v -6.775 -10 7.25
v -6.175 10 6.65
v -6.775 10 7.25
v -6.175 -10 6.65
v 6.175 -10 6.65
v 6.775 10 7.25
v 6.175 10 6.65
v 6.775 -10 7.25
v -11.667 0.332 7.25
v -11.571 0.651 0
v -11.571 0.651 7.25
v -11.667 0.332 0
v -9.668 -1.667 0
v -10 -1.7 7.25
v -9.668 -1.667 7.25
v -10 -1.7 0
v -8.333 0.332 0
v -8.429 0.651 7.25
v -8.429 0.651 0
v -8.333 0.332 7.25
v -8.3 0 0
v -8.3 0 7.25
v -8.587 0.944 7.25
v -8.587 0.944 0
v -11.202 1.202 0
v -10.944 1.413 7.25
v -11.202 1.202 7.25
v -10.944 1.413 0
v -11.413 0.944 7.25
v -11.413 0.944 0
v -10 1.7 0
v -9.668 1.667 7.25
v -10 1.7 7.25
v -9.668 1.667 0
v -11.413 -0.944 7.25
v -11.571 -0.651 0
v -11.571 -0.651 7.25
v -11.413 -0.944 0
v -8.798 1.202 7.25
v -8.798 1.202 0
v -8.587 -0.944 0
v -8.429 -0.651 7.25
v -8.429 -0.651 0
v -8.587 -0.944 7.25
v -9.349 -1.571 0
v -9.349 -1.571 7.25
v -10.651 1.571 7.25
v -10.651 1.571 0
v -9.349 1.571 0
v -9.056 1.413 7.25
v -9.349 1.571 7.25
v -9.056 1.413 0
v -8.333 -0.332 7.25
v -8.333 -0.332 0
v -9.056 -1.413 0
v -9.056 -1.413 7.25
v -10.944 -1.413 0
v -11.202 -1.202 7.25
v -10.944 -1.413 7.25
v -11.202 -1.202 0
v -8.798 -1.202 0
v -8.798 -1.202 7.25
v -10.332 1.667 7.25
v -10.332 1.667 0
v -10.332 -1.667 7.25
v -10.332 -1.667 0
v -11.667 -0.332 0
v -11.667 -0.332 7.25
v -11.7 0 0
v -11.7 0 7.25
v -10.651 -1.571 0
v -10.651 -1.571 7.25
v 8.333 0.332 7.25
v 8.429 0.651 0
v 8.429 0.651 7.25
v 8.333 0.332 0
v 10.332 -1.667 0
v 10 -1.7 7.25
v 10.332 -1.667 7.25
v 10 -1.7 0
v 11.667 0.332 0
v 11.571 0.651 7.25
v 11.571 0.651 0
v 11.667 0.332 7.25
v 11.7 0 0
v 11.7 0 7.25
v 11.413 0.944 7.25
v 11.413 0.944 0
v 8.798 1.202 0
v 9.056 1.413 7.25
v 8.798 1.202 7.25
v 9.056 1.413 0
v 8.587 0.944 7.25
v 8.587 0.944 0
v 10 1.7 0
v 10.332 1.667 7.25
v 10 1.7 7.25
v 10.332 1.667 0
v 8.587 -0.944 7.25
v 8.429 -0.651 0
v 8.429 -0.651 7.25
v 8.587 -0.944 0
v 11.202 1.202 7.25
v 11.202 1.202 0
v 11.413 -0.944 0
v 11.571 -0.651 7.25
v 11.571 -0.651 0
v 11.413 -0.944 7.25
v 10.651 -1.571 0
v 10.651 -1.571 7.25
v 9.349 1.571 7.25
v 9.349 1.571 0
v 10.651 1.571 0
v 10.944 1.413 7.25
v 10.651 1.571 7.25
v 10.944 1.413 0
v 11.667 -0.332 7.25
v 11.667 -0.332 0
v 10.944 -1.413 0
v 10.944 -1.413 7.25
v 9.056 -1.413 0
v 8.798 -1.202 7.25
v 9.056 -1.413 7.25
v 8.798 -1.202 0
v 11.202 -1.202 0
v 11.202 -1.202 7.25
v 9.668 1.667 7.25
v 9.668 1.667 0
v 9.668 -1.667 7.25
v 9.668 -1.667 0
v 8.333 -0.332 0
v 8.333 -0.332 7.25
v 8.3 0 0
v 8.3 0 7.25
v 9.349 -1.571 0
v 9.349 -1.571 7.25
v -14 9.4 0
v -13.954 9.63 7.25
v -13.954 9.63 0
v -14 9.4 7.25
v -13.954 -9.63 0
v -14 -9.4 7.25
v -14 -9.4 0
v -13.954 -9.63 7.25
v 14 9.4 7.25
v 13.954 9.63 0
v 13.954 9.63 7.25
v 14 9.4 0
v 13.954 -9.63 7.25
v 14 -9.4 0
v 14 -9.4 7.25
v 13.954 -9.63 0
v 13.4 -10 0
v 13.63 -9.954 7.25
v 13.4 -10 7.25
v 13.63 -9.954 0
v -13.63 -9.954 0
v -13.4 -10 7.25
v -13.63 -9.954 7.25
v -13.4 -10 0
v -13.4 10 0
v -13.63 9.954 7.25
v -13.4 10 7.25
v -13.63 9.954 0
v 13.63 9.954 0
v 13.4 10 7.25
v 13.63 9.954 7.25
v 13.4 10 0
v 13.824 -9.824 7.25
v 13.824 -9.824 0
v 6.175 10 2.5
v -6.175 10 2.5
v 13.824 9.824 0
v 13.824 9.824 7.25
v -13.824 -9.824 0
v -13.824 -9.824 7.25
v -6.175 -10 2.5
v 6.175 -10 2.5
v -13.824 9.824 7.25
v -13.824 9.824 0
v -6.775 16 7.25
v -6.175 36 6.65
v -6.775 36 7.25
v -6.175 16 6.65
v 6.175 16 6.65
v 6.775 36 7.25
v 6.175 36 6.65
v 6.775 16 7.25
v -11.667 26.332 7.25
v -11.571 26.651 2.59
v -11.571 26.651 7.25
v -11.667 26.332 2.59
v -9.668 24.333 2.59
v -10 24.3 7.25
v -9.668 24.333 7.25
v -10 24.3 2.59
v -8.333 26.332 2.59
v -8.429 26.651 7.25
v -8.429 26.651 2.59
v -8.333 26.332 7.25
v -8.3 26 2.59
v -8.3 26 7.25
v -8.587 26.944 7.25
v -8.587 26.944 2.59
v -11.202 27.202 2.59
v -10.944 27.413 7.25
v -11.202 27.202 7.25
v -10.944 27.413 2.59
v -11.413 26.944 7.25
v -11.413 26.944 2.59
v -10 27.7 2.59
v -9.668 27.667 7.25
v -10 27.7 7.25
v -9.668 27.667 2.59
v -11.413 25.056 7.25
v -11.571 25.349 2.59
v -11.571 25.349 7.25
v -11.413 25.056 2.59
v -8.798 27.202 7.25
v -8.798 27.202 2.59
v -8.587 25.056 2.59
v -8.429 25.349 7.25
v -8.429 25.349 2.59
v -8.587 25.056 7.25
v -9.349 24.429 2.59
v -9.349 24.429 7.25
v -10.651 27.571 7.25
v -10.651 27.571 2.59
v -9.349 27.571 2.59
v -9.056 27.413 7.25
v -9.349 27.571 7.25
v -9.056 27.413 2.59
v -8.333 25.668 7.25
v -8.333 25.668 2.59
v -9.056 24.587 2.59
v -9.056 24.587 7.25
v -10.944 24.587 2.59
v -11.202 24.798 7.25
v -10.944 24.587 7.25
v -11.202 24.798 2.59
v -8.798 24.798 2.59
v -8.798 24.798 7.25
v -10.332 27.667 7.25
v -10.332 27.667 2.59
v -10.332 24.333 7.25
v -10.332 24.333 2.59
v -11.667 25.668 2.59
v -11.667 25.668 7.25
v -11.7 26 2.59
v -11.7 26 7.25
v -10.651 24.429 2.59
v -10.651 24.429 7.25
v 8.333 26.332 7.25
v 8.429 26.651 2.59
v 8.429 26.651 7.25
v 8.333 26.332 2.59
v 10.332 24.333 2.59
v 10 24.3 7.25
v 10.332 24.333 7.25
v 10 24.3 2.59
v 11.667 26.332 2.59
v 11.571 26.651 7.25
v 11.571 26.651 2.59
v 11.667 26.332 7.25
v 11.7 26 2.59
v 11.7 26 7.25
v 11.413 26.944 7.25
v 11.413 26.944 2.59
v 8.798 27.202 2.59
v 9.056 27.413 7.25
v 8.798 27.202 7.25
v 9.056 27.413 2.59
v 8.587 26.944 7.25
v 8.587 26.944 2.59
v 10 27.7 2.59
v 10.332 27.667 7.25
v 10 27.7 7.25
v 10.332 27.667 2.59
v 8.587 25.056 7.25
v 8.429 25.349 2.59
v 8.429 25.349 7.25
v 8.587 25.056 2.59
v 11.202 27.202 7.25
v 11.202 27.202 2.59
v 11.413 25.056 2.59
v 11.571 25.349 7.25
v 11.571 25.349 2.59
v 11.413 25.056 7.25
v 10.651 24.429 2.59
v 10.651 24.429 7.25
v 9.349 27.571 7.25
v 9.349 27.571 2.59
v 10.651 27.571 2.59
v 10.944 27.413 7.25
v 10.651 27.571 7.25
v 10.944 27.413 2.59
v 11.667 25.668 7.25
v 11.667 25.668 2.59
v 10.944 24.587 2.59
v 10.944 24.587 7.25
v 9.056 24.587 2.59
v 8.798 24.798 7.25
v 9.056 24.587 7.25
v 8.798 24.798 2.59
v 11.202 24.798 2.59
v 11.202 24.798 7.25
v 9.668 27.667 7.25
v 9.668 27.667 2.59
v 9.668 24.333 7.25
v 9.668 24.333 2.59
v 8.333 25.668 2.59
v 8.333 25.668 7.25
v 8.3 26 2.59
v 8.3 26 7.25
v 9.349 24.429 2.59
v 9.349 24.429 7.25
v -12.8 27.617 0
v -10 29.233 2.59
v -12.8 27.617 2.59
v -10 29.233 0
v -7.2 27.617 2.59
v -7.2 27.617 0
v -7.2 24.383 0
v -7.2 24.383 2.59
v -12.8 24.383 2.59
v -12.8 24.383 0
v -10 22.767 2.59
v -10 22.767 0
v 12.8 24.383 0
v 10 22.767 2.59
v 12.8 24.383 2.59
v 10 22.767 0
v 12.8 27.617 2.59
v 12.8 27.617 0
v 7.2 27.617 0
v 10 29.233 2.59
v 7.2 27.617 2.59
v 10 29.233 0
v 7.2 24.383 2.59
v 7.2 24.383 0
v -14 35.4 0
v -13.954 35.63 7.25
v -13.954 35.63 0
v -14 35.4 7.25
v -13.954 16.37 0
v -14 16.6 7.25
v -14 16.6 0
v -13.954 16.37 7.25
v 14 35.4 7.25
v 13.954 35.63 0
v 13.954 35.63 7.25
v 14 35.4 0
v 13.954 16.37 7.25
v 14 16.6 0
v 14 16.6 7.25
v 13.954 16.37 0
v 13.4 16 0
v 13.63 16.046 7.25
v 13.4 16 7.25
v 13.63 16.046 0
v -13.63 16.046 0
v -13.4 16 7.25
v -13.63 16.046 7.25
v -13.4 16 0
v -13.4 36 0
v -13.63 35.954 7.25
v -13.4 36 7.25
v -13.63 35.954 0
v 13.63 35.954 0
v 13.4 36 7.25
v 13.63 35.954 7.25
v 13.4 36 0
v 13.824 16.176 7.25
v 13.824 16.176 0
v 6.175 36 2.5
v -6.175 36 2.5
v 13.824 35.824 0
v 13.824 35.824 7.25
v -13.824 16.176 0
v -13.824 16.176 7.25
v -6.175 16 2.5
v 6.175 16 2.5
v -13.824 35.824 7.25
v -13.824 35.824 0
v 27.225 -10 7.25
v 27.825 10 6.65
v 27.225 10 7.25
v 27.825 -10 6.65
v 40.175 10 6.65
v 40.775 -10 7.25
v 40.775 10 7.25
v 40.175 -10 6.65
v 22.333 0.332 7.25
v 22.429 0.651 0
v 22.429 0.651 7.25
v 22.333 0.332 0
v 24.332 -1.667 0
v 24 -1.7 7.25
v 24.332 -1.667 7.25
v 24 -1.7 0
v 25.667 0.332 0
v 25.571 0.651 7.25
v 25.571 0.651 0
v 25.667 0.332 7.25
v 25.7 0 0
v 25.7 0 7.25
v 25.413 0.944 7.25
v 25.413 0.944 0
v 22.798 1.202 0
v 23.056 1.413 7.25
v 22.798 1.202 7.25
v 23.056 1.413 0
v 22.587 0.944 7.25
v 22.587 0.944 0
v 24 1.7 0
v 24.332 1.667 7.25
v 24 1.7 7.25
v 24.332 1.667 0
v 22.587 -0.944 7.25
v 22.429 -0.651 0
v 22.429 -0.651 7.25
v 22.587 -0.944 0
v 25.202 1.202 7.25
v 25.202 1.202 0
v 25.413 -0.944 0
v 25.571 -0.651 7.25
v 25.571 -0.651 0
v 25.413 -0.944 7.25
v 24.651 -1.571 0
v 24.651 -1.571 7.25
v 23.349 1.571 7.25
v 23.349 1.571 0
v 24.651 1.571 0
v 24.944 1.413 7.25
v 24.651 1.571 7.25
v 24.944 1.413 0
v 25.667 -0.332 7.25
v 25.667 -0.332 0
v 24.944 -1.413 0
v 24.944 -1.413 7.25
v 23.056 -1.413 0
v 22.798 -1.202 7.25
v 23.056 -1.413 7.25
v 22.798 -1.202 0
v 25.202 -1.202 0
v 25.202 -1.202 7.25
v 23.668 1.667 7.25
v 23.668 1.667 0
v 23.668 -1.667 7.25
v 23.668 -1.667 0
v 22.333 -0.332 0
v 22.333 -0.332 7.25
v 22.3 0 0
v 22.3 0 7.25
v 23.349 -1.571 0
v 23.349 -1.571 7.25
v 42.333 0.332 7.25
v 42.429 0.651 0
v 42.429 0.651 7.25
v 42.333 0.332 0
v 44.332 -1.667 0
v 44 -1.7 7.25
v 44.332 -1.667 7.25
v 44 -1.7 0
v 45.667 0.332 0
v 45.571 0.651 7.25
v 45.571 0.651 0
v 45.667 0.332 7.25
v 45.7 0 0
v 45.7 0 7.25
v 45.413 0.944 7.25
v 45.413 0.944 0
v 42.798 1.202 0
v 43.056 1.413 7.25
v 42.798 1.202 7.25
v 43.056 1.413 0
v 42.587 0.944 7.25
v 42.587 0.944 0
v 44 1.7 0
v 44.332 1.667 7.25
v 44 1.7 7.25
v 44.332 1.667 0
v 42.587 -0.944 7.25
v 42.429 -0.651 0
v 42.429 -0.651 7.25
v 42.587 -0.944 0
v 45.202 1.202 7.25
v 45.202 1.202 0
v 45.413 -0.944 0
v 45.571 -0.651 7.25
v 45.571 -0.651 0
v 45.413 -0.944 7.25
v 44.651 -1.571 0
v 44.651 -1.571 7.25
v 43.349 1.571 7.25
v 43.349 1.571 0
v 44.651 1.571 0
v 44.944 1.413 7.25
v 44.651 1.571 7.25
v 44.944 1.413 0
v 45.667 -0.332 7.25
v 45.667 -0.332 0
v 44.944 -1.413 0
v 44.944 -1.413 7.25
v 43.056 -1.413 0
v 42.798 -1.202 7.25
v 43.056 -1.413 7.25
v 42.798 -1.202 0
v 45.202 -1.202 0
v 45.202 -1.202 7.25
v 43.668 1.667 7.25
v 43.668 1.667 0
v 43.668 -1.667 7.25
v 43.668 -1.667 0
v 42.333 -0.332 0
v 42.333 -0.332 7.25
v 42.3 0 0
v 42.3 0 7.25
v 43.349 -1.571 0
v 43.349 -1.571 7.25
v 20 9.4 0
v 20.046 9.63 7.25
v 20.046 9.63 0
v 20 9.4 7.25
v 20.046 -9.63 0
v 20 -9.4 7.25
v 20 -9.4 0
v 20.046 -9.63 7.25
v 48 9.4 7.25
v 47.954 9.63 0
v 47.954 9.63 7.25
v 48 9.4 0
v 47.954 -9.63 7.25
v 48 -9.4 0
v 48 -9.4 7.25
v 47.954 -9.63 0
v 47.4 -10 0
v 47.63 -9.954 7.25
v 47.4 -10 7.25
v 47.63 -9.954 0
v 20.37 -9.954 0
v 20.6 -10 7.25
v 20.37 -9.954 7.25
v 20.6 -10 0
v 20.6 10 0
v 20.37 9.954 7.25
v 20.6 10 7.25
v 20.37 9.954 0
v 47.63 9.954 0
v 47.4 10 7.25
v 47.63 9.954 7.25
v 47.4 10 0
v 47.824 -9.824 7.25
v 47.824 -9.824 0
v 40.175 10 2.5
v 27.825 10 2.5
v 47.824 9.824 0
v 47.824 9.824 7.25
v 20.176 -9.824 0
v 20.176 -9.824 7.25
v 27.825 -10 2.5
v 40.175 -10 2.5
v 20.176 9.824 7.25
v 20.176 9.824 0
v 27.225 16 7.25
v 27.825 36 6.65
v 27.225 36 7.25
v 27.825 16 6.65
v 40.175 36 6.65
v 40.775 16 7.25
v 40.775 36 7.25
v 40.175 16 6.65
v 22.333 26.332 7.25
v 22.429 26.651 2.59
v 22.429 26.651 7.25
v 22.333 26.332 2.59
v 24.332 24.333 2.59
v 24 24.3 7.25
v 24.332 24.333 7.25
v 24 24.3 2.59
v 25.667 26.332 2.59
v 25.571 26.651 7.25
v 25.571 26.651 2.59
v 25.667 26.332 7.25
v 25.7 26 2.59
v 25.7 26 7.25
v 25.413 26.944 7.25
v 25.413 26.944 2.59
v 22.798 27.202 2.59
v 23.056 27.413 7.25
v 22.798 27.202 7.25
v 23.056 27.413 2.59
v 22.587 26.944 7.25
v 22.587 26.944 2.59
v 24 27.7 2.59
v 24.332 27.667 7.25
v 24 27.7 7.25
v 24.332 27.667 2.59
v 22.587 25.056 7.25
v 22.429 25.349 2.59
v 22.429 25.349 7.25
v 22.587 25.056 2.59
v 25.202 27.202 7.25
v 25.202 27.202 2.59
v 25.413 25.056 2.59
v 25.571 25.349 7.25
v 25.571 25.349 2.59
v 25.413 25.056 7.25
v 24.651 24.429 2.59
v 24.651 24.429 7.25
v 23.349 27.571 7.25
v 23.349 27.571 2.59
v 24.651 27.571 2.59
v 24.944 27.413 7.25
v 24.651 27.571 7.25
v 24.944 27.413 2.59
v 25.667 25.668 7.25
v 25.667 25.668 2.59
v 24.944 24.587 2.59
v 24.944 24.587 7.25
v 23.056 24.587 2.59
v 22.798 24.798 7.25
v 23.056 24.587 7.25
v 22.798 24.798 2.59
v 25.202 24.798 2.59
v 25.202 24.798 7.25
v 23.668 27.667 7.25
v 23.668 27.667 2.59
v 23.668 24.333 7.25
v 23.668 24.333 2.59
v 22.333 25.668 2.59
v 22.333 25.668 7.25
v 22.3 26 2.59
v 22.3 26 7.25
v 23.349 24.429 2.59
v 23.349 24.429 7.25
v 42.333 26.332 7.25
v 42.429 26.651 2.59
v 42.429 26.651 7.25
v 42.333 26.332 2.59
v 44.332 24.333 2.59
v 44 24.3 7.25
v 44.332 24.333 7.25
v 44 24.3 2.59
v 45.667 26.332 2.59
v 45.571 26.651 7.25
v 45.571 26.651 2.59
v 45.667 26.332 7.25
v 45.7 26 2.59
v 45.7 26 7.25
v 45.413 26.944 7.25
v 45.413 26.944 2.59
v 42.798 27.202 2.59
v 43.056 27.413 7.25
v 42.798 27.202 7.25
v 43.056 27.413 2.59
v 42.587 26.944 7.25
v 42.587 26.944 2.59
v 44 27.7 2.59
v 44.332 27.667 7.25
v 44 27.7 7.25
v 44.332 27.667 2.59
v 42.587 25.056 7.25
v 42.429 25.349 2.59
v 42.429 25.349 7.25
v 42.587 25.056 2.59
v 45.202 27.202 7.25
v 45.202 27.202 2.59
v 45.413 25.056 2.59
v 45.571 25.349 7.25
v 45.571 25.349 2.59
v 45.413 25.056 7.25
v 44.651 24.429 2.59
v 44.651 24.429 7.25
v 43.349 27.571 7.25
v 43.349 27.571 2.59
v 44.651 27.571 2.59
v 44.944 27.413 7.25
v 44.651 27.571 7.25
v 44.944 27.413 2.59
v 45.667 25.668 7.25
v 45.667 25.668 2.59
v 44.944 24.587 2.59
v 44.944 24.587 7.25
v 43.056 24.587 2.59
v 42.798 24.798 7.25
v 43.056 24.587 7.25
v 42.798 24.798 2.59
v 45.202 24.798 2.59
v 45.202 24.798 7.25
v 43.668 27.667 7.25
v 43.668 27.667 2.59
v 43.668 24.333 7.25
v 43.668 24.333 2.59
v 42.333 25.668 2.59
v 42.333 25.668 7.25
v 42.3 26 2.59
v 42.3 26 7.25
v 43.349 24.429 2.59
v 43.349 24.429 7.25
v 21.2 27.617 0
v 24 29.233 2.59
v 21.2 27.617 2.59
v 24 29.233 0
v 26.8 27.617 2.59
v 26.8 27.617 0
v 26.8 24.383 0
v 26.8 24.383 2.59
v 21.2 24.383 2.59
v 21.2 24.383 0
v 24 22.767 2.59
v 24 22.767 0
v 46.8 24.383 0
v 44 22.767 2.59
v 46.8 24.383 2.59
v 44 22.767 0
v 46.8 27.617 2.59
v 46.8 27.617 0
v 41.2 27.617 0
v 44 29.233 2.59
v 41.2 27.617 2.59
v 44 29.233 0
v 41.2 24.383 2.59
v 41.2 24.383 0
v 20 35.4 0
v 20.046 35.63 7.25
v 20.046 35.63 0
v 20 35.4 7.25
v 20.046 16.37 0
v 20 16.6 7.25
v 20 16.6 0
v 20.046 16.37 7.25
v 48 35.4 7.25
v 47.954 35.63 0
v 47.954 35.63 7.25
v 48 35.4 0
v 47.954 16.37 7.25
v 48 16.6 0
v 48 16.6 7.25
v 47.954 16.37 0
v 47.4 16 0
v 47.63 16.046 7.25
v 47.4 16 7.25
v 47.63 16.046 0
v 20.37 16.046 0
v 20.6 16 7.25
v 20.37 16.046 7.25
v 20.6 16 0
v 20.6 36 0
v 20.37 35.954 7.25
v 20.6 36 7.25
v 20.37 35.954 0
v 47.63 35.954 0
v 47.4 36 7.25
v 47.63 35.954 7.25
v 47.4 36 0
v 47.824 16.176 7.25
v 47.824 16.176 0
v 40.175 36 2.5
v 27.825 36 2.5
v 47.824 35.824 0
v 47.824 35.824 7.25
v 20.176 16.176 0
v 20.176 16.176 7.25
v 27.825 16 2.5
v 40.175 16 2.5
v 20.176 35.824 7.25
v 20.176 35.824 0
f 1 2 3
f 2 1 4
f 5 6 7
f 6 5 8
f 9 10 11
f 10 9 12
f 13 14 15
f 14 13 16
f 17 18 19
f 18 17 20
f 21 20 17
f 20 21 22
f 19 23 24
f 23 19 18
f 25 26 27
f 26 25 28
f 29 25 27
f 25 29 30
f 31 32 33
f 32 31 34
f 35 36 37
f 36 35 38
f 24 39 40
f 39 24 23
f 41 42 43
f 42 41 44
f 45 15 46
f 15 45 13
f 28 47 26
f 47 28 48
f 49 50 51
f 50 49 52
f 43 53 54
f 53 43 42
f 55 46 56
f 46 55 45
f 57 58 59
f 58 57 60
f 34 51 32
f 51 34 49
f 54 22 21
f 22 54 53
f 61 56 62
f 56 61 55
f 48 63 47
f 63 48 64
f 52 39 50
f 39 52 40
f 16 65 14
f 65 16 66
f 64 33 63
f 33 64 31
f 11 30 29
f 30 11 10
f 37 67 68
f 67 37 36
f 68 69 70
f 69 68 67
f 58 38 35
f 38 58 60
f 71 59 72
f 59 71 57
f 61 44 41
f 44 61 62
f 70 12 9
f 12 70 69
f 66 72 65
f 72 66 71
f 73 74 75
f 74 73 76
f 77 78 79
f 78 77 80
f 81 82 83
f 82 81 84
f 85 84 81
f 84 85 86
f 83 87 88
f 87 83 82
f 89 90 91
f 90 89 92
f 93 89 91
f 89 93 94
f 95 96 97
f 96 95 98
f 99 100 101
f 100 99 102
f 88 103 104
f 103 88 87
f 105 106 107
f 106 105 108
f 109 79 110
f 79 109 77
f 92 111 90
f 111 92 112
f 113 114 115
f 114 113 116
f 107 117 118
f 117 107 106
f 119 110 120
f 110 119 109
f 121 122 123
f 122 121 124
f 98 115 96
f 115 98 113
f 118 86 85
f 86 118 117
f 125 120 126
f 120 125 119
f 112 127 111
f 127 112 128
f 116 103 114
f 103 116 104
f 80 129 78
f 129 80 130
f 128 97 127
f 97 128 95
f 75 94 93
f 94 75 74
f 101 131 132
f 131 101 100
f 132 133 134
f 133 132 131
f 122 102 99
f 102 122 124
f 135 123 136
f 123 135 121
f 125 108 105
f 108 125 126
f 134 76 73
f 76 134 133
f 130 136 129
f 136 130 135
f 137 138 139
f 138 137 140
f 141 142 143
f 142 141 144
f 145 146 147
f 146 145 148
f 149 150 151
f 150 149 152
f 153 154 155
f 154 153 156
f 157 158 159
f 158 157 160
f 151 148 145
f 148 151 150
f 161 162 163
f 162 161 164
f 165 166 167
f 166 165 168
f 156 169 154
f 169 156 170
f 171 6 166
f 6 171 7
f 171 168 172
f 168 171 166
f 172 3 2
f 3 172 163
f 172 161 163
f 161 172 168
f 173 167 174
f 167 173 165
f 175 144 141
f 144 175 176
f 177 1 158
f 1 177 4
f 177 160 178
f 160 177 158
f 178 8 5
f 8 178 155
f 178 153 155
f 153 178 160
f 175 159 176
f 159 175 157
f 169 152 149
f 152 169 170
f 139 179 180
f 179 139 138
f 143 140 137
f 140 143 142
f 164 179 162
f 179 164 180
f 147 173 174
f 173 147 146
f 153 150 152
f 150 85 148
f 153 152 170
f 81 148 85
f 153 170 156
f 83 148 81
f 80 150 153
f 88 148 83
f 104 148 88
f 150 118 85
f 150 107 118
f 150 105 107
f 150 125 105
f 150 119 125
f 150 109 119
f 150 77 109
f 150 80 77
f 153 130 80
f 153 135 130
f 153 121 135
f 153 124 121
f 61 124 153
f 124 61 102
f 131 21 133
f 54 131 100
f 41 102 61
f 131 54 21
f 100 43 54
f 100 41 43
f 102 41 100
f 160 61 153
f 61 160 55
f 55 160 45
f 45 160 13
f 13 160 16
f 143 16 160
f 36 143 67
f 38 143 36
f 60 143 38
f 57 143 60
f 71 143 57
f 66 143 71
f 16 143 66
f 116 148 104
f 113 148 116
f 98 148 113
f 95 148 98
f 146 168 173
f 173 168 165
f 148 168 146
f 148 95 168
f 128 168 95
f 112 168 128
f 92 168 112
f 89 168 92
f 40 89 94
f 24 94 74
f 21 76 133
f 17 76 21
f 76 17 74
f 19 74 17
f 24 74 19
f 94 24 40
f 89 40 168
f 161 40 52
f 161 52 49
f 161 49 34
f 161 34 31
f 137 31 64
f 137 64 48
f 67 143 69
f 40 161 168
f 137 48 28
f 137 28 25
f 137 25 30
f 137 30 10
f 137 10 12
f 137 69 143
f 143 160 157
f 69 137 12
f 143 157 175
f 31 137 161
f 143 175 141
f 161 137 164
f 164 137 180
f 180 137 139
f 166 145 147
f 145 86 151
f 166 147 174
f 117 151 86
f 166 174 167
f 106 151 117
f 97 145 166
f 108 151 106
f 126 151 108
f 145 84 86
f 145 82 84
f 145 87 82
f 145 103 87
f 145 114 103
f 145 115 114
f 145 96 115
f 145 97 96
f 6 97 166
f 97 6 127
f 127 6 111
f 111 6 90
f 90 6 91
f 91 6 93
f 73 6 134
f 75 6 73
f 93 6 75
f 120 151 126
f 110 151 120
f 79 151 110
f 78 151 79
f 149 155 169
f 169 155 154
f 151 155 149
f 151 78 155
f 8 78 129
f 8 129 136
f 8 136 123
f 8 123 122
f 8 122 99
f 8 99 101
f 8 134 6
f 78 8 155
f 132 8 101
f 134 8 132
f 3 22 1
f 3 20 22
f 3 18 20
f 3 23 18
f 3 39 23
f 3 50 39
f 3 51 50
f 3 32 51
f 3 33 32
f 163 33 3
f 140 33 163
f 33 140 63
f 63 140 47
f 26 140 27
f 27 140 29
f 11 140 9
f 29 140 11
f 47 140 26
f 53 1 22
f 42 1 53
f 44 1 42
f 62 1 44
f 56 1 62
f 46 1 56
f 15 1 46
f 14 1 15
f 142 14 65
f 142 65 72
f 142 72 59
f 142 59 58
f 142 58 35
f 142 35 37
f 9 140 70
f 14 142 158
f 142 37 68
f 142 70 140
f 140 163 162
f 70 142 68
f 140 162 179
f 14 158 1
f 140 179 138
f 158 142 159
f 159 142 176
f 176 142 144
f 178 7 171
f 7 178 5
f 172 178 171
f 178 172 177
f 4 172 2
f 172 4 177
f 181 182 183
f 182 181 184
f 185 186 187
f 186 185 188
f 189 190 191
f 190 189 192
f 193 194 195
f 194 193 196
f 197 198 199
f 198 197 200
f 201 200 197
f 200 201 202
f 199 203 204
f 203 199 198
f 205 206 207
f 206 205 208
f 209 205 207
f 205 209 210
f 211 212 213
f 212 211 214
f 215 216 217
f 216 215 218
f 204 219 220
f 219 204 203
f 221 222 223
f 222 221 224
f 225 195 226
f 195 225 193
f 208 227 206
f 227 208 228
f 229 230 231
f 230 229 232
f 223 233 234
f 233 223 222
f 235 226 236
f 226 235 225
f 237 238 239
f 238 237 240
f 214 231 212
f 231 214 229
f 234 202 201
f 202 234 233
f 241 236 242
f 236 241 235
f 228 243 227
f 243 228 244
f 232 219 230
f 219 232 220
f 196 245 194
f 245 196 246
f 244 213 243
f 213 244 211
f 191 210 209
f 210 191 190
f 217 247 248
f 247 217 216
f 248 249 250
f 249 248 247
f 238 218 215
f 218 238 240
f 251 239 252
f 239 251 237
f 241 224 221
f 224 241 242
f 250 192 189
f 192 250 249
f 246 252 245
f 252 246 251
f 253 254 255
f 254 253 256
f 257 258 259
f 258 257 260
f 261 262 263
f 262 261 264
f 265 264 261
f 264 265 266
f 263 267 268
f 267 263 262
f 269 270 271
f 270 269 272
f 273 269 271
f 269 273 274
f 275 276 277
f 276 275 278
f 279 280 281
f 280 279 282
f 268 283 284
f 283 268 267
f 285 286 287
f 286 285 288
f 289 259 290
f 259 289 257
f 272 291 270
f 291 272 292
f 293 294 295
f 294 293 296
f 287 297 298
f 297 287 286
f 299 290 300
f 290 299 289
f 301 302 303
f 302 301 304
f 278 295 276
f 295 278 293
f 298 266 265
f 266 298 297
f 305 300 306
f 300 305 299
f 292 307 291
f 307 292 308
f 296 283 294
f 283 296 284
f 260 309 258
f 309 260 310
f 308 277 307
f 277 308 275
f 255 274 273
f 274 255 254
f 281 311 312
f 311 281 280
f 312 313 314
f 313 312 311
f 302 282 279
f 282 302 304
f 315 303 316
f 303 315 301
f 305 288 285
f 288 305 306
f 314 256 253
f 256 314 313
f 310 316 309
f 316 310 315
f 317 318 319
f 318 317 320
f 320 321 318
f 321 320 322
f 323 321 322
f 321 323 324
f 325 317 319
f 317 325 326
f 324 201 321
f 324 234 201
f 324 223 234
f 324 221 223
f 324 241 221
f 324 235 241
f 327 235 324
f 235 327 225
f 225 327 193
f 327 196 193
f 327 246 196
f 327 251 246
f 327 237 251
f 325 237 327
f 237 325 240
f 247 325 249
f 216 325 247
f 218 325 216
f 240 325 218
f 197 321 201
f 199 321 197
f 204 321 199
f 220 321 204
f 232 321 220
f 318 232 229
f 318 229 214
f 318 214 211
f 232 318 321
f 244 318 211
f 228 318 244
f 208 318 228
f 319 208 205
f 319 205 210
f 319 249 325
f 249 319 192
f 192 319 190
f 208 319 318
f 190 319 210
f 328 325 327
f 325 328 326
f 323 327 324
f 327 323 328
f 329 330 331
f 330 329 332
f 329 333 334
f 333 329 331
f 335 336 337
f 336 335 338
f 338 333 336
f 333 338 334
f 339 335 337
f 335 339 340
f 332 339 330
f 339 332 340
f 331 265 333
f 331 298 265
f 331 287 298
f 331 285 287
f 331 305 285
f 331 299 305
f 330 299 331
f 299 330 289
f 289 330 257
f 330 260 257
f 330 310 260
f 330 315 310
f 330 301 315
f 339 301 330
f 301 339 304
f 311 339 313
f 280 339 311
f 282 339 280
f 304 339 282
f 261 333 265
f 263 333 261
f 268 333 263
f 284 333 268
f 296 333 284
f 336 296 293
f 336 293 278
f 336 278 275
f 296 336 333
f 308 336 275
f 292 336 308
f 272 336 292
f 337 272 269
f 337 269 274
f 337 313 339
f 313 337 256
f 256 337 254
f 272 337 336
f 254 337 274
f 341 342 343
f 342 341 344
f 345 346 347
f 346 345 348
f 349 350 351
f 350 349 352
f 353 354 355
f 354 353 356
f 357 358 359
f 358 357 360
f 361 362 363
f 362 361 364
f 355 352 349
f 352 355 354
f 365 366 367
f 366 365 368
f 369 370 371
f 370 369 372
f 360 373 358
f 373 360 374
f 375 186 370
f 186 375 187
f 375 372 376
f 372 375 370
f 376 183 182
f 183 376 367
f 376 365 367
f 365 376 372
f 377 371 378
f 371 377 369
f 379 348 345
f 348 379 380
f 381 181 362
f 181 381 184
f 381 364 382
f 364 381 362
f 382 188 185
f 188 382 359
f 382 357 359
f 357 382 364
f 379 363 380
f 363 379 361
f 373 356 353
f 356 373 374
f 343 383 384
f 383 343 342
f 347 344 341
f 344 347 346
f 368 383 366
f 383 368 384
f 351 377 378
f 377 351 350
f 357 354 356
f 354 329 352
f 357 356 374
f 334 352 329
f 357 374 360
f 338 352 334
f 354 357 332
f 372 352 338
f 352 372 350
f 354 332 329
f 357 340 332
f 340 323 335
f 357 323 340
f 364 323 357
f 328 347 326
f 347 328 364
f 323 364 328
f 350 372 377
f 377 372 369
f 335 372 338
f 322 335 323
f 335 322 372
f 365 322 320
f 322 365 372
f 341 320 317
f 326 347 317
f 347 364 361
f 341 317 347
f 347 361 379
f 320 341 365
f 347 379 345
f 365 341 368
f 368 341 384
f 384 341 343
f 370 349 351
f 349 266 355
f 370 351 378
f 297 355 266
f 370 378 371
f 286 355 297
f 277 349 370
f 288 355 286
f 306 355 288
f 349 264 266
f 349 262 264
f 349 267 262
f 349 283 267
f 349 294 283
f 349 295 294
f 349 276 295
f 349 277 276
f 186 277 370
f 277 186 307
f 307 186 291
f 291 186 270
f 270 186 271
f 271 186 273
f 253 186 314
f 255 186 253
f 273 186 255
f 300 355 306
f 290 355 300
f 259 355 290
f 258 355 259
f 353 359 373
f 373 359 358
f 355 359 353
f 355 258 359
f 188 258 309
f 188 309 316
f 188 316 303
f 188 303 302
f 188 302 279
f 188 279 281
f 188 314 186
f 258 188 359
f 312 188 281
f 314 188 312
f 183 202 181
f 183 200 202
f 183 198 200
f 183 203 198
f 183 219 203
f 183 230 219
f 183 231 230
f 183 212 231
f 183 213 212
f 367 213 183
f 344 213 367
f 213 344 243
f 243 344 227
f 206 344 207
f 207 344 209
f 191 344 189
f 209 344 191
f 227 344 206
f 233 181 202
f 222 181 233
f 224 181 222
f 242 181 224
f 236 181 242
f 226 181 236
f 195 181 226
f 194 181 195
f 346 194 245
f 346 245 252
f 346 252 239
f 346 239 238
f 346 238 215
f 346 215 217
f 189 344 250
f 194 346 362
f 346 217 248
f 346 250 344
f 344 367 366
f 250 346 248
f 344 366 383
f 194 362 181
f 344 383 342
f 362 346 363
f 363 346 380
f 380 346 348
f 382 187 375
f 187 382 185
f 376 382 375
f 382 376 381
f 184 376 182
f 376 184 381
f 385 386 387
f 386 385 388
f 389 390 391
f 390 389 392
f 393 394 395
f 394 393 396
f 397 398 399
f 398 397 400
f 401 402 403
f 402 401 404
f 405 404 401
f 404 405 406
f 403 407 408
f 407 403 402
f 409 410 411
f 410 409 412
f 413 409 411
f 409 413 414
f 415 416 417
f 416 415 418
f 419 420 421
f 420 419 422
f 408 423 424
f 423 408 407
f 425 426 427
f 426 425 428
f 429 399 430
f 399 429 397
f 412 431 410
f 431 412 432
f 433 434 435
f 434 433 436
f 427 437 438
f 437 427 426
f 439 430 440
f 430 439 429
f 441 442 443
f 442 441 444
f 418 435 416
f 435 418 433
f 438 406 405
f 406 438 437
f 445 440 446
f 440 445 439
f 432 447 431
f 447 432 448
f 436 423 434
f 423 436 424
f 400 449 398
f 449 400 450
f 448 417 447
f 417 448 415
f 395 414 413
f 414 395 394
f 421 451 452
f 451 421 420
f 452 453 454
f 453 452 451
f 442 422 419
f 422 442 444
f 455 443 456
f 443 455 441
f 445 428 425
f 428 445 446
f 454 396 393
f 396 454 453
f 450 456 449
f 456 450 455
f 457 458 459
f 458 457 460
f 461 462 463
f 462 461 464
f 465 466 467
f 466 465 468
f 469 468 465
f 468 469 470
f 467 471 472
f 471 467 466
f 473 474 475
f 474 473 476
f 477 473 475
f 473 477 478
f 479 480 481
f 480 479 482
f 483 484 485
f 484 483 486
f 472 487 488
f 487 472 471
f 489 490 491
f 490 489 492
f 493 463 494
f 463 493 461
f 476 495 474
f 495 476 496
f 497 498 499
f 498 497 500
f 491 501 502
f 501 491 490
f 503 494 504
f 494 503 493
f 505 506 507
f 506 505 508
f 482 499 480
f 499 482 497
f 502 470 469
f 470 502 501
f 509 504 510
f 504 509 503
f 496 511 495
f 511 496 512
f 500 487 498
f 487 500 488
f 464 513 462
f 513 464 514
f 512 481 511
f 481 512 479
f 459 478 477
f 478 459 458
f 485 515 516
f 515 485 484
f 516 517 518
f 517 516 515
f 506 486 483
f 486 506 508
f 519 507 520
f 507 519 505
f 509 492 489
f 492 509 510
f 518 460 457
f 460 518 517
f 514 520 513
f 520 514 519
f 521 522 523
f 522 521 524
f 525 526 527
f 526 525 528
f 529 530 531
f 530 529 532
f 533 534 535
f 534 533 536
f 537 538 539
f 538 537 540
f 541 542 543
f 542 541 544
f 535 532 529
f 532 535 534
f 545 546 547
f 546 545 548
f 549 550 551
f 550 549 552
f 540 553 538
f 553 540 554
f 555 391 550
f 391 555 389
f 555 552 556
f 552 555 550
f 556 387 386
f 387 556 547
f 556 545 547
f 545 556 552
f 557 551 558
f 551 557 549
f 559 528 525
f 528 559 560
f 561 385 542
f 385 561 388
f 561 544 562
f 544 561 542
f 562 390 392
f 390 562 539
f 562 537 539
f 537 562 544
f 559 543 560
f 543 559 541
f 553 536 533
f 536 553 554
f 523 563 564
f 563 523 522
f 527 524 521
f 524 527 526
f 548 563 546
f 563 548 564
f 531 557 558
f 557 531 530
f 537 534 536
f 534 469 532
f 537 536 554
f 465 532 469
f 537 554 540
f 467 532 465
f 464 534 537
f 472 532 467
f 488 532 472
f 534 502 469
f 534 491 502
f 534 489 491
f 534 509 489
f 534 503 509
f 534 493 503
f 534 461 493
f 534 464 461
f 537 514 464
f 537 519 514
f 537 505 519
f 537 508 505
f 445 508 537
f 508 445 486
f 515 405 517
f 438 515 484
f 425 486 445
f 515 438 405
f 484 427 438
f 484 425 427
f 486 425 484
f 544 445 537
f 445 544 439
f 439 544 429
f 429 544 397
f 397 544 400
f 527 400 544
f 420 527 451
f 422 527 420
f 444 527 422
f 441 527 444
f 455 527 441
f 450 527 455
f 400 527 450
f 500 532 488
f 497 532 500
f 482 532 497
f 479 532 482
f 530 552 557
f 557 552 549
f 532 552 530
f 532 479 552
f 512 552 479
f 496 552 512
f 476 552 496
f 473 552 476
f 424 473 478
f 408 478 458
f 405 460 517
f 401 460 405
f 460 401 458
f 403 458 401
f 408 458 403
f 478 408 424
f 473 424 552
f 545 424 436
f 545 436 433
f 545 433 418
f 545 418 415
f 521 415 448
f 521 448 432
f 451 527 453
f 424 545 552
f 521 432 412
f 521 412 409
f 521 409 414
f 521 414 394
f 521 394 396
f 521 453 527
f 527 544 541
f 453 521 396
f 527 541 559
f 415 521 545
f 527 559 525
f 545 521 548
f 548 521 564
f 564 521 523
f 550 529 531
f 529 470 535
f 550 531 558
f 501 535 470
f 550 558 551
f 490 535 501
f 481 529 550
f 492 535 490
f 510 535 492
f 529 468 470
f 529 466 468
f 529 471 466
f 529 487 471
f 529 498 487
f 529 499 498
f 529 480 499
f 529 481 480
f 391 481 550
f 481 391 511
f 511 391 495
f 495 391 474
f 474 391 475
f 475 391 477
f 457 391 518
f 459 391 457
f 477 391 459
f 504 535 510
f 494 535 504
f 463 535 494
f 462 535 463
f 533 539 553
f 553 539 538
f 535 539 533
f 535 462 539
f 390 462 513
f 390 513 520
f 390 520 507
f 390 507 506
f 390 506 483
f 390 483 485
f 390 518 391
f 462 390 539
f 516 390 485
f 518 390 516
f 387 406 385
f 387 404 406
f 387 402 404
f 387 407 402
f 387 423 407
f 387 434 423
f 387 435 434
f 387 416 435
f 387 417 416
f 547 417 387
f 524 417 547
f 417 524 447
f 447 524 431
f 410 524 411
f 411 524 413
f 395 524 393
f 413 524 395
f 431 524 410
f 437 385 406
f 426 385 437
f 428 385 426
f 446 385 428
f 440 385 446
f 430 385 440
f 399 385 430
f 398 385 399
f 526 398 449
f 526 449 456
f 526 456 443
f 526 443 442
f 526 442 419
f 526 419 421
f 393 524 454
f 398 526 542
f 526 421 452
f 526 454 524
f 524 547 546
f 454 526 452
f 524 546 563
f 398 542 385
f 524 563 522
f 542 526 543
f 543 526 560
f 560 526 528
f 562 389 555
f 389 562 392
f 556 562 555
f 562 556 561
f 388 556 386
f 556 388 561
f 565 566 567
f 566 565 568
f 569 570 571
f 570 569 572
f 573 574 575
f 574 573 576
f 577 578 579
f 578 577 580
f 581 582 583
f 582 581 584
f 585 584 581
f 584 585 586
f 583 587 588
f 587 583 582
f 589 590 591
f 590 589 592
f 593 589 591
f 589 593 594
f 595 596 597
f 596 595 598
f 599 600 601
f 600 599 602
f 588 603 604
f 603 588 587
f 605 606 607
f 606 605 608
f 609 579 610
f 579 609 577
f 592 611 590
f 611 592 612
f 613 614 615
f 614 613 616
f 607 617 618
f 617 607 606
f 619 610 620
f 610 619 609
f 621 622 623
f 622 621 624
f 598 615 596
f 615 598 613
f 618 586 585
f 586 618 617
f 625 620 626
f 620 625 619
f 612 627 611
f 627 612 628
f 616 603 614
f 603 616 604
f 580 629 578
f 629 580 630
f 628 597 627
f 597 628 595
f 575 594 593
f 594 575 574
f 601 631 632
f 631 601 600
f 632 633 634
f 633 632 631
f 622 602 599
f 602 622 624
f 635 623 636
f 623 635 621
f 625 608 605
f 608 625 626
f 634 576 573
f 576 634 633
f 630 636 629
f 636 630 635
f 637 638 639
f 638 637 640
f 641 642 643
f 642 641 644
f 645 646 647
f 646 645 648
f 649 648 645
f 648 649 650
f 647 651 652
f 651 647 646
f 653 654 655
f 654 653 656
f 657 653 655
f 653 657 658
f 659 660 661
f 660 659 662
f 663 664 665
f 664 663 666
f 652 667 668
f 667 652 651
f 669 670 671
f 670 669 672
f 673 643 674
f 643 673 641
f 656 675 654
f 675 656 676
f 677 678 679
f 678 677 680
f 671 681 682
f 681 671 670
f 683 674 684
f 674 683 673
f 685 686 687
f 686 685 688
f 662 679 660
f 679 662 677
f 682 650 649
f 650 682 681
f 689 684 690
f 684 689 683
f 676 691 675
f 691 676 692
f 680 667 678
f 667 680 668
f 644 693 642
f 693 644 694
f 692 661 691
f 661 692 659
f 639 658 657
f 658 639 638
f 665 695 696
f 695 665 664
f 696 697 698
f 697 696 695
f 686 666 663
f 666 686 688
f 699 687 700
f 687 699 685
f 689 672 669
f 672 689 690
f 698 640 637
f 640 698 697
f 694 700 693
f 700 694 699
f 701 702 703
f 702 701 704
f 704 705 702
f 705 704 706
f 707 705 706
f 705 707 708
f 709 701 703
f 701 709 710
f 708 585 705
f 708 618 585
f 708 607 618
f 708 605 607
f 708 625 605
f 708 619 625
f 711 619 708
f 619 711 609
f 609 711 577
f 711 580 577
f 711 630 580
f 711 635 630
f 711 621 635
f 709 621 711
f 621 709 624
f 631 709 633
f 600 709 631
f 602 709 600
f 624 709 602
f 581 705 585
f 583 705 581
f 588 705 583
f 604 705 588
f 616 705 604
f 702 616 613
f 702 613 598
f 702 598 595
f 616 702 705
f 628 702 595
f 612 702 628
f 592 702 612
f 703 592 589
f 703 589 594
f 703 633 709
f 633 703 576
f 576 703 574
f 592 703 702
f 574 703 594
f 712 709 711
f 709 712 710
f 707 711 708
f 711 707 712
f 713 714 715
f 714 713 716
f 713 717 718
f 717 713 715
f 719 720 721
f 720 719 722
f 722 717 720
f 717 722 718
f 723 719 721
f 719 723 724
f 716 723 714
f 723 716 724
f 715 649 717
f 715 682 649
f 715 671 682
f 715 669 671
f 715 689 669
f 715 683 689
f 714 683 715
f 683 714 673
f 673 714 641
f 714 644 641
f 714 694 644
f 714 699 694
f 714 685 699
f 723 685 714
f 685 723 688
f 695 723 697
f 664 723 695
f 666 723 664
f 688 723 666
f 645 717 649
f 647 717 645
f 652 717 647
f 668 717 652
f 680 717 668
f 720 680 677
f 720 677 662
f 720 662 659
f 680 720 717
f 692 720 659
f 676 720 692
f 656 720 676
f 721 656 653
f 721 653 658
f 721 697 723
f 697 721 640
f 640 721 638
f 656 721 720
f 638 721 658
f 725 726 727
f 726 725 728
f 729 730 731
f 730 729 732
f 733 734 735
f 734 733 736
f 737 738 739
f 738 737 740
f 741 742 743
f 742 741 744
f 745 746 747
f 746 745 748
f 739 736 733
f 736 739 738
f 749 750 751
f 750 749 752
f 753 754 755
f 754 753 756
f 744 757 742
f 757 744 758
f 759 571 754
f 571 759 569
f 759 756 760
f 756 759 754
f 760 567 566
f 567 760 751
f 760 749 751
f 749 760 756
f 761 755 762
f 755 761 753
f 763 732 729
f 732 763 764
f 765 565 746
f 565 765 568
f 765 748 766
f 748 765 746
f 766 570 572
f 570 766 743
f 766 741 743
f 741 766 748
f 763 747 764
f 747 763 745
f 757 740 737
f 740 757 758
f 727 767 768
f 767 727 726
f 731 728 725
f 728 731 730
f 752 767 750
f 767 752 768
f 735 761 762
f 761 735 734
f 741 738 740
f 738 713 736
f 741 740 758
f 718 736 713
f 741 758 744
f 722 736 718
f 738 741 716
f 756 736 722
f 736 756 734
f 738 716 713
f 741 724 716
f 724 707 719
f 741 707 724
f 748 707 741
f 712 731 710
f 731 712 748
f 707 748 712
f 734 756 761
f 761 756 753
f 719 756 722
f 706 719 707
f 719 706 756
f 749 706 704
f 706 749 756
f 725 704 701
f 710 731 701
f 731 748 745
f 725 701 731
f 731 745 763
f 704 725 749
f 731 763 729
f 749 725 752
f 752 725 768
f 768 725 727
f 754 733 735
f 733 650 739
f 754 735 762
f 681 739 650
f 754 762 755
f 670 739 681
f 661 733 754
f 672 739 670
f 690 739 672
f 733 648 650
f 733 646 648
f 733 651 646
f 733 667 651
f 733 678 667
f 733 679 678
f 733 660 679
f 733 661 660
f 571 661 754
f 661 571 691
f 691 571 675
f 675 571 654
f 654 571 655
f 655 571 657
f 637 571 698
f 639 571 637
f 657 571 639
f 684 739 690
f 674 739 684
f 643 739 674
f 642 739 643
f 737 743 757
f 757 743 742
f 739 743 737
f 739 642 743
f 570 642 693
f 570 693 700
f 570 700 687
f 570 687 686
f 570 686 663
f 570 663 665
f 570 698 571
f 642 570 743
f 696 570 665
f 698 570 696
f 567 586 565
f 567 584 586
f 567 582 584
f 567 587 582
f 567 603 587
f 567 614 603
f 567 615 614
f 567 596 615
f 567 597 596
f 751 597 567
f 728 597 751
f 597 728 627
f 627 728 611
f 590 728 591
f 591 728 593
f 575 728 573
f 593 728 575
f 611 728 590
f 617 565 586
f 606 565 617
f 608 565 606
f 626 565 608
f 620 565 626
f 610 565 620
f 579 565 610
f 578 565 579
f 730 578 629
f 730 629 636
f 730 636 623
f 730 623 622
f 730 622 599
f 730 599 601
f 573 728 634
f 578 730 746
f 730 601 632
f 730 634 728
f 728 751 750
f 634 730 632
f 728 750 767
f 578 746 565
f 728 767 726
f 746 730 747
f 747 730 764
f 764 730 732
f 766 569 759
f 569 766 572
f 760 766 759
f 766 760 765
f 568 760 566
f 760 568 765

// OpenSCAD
// =====================================================================
//  GA12-N20 (with encoder) two-piece clamp for the BO-BOT base plate
// =====================================================================
//  Holds the motor BODY (gearbox + can, 12 x 10 mm) between two halves
//  squeezed by two M3 screws. The encoder end stays free.
//
//   base plate (3 mm)       ===============================
//   TOP saddle (bolts up)   [##]   ___________   [##]
//                           [##]  |  motor    |  [##]   <- M3 screws 20 mm apart,
//   BOTTOM cap (nut traps)  [##]  |___________|  [##]      one each side of the motor
//
//  Print: 2 x TOP + 2 x BOTTOM, flat side on the bed, channel facing up.
//  PLA or PETG, 0.2 mm layers, 4 walls, 40 % infill, no supports.
//  Screws: M3 x 20 (from the top of the plate) + M3 nuts in the cap.
//  All sizes in mm. Change the numbers below if your motor measures differently.
// =====================================================================

part = "set";            // "top", "bottom", "set" (2 tops + 2 bottoms), "assembly"

motor_w   = 12.0;        // motor body width  (measure across the gearbox)
motor_h   = 10.0;        // motor body height (across the flats)
fit       = 0.35;        // extra room in the channel width (FDM)
squeeze   = 0.25;        // each half is this much shallower than half the motor -> grip
L         = 20.0;        // clamp length along the motor
hole_sp   = 20.0;        // M3 hole spacing = base plate slots
B         = 28.0;        // clamp width (across the motor)
wall      = 2.5;         // material above / below the motor
m3        = 3.4;         // M3 clearance hole
nut_af    = 5.6;         // M3 nut across flats (+ a little room)
nut_depth = 2.6;         // nut trap depth in the cap
chamfer   = 0.6;

half_d = motor_h / 2 - squeeze;            // channel depth in each half
H      = wall + half_d;                    // height of each half
ch_w   = motor_w + fit;

module half(nut_trap = false) {
    difference() {
        // body with chamfered vertical edges
        hull() for (x = [-B/2 + chamfer, B/2 - chamfer], y = [-L/2 + chamfer, L/2 - chamfer])
            translate([x, y, 0]) cylinder(r = chamfer, h = H, $fn = 16);
        // motor channel (open on the top face of this half)
        translate([-ch_w/2, -L/2 - 1, wall]) cube([ch_w, L + 2, half_d + 1]);
        // lead-in chamfer along the channel edges
        for (s = [-1, 1]) translate([s * ch_w/2, 0, H]) rotate([90, 0, 0])
            cylinder(r = 0.6, h = L + 2, center = true, $fn = 4);
        // M3 holes
        for (s = [-1, 1]) translate([s * hole_sp/2, 0, -1]) cylinder(d = m3, h = H + 2, $fn = 32);
        // hex nut traps on the outside face of the cap
        if (nut_trap) for (s = [-1, 1]) translate([s * hole_sp/2, 0, -0.01])
            rotate([0, 0, 30]) cylinder(d = nut_af / cos(30), h = nut_depth, $fn = 6);
    }
}

module top()    { half(false); }
module bottom() { half(true); }

module motor_dummy() {   // for the assembly view only
    color("silver") translate([0, 0, 0]) cube([motor_w, 24, motor_h], center = true);
    color("green") translate([0, -12 - 1, 0]) cube([12, 2, 10], center = true);   // encoder board
    color("gray") translate([0, 12, 0]) rotate([-90, 0, 0]) cylinder(d = 3, h = 10, $fn = 24);
}

if (part == "top") top();
else if (part == "bottom") bottom();
else if (part == "set") {
    for (i = [0, 1]) {
        translate([i * (B + 6), 0, 0]) top();
        translate([i * (B + 6), L + 6, 0]) bottom();
    }
}
else if (part == "assembly") {
    // exploded: plate strip, TOP saddle (channel down), motor, BOTTOM cap (nuts down)
    e = 9;   // explode distance
    color("tan") translate([-B/2 - 6, -L/2 - 4, H + 2*e]) cube([B + 12, L + 8, 3]);
    color("orange") translate([0, 0, H + e]) mirror([0, 0, 1]) top();
    rotate([0, 0, 0]) motor_dummy();
    color("orange") translate([0, 0, -H - e]) bottom();
    color("gray") for (s = [-1, 1]) translate([s * hole_sp/2, 0, -H - e - 3]) cylinder(d = 2.8, h = 2*H + 3*e + 9, $fn = 16);
    color("dimgray") for (s = [-1, 1]) translate([s * hole_sp/2, 0, H + 2*e + 3]) cylinder(d = 5.5, h = 2.5, $fn = 24);
}
